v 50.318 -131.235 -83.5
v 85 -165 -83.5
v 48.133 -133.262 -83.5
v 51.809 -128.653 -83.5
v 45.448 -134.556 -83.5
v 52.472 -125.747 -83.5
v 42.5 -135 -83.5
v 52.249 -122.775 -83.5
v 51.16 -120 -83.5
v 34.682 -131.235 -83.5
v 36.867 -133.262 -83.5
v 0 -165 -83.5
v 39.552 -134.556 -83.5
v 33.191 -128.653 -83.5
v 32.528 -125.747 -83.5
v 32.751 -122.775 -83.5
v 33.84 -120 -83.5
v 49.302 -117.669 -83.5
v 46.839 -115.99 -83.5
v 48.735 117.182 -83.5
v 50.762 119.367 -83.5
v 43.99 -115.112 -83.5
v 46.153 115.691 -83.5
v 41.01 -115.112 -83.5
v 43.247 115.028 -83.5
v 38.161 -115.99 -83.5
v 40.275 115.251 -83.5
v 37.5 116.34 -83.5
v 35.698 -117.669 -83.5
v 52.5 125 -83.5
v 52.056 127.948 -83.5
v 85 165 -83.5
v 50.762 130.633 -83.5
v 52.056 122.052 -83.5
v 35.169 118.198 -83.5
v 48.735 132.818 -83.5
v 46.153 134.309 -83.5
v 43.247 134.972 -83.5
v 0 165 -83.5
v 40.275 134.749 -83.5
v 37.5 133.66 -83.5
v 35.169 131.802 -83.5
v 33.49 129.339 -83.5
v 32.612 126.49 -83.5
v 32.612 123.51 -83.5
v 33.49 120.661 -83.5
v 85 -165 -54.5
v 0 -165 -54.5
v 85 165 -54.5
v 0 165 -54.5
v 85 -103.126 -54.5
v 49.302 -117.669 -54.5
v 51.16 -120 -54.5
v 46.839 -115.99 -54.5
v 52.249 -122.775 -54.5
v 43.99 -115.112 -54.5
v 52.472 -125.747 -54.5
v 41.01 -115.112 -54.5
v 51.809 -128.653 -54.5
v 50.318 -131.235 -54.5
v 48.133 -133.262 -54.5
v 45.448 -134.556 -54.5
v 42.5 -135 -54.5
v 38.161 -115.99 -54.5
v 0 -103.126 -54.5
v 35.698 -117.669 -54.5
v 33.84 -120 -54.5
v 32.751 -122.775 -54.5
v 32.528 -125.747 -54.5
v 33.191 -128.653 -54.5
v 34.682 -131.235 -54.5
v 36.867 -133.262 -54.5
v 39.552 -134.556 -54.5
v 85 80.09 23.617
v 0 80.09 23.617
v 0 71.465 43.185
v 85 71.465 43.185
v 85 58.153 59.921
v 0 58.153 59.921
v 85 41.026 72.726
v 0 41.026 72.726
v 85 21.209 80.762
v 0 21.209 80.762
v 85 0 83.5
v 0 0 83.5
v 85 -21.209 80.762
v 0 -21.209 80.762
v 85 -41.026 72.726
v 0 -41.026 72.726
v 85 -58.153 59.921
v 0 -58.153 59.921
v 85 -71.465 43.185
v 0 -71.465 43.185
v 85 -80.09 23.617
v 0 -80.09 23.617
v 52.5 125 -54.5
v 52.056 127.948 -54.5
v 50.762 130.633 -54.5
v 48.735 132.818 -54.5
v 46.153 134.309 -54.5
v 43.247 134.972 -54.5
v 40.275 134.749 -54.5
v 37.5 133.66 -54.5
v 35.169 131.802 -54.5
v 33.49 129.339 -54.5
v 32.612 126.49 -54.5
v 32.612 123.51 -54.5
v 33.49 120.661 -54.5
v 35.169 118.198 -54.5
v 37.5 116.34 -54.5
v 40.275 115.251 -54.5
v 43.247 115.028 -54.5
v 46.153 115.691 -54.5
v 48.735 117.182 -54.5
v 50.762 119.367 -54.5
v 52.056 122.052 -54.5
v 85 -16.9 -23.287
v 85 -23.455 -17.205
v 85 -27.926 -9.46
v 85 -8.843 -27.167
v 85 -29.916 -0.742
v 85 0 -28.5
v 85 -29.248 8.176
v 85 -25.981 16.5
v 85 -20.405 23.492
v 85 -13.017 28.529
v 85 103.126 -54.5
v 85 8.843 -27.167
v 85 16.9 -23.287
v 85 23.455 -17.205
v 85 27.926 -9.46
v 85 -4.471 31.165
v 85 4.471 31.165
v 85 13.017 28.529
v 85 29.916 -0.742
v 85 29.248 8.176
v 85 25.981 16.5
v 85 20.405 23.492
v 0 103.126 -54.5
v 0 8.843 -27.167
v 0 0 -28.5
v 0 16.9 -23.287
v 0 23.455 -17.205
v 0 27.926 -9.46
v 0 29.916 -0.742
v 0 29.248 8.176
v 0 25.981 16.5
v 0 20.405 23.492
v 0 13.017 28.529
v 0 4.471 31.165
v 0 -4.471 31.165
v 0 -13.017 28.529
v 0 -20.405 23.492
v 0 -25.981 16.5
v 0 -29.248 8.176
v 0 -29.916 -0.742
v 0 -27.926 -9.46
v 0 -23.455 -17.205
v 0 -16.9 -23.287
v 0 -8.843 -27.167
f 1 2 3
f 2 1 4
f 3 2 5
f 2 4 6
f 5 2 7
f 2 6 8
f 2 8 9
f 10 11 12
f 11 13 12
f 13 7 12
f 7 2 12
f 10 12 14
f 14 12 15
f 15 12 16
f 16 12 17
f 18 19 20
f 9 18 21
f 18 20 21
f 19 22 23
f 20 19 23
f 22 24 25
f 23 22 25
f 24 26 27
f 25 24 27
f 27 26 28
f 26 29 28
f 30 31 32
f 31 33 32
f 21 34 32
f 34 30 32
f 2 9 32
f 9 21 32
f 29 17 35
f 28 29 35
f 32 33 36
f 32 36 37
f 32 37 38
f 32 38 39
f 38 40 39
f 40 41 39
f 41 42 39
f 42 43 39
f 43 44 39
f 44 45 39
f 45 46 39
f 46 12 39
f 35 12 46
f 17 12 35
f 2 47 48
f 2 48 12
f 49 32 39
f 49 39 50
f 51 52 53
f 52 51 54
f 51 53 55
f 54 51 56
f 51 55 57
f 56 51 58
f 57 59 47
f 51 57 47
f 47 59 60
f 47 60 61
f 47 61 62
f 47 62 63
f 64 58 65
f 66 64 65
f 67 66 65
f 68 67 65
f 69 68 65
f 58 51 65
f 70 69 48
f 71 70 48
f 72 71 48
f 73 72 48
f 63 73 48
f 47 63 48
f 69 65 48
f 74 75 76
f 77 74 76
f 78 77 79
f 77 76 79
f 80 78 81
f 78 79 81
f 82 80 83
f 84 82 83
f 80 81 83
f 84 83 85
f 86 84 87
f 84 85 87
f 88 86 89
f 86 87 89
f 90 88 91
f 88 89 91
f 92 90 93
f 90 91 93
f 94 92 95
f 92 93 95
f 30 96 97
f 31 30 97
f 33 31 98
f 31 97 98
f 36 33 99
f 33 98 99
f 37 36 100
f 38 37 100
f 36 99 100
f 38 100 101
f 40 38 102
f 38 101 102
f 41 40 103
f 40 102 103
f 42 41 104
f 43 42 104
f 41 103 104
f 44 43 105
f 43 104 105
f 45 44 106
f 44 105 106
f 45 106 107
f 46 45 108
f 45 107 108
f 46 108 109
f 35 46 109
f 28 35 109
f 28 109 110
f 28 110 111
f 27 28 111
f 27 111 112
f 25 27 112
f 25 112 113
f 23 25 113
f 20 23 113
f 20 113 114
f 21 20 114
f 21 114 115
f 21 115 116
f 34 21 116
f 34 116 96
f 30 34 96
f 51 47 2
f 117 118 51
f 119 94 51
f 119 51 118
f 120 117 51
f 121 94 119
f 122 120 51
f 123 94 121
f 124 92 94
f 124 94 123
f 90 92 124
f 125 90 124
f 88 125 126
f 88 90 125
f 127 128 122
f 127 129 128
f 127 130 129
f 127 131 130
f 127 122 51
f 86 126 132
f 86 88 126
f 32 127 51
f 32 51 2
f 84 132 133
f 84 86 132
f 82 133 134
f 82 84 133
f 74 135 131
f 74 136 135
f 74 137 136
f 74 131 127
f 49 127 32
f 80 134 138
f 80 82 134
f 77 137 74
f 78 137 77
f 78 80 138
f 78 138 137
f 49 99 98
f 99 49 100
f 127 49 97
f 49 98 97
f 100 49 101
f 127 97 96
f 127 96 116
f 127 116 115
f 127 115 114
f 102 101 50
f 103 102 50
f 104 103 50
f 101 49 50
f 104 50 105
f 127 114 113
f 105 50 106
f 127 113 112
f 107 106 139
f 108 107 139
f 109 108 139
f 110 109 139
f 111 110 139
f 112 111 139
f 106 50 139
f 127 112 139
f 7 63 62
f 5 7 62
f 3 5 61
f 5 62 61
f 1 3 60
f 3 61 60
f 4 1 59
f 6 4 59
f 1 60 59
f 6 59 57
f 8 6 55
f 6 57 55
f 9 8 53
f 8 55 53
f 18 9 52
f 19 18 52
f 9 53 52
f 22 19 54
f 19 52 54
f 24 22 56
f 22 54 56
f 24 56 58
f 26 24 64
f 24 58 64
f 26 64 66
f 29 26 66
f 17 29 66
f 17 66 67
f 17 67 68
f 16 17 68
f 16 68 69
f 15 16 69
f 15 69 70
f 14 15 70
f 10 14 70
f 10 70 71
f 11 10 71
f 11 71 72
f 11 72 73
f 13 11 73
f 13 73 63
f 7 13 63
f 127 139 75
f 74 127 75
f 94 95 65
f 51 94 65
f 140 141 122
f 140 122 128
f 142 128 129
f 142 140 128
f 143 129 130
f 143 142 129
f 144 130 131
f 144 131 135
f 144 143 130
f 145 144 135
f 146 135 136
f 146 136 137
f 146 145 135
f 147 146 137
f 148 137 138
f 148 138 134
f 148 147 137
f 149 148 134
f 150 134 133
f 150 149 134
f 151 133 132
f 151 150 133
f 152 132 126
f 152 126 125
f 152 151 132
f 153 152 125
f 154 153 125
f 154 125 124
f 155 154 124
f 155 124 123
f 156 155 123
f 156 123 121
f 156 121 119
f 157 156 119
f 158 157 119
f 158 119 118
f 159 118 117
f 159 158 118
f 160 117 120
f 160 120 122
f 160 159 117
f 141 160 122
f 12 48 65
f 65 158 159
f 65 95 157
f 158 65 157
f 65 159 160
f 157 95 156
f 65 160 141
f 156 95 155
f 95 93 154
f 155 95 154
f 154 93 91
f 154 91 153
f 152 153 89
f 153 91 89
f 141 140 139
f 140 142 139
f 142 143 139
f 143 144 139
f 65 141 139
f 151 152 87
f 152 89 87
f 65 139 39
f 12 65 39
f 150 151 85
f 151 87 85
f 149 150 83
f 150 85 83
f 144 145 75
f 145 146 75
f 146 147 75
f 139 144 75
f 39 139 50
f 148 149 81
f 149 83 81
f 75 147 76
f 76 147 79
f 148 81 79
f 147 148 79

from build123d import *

# Parameters (mm, degrees)
SKETCH1_R           = 30
BOSS_EXTRUDE1_DEPTH = 85
SKETCH2_R           = 10
CUT_EXTRUDE1_DEPTH  = 85


with BuildPart() as part:
    # Sketch1 → Boss-Extrude1 (new body)
    with BuildSketch(Plane.YZ):
        with BuildLine():
            Line((-165, -83.5), (165, -83.5))
            Line((165, -83.5), (165, -54.5))
            Line((165, -54.5), (103.12562301, -54.5))
            Line((103.12562301, -54.5), (80.090474911, 23.617066466))
            ThreePointArc((80.090474911, 23.617066466), (0, 83.5), (-80.090474911, 23.617066466))
            Line((-80.090474911, 23.617066466), (-103.12562301, -54.5))
            Line((-103.12562301, -54.5), (-165, -54.5))
            Line((-165, -54.5), (-165, -83.5))
        make_face()
        with Locations(Location((0, 1.5, 0), (0, 0, 270))):
            Circle(SKETCH1_R, mode=Mode.SUBTRACT)
    extrude(amount=BOSS_EXTRUDE1_DEPTH)

    # Sketch2 → Cut-Extrude1 (cut)
    with BuildSketch(Plane.XY.offset(-54.5)):
        with Locations((42.5, 125)):
            Circle(SKETCH2_R)
        with Locations(Location((42.5, -125, 0), (0, 0, 270))):
            Circle(SKETCH2_R)
    extrude(amount=-CUT_EXTRUDE1_DEPTH, mode=Mode.SUBTRACT)


solid = part.part
